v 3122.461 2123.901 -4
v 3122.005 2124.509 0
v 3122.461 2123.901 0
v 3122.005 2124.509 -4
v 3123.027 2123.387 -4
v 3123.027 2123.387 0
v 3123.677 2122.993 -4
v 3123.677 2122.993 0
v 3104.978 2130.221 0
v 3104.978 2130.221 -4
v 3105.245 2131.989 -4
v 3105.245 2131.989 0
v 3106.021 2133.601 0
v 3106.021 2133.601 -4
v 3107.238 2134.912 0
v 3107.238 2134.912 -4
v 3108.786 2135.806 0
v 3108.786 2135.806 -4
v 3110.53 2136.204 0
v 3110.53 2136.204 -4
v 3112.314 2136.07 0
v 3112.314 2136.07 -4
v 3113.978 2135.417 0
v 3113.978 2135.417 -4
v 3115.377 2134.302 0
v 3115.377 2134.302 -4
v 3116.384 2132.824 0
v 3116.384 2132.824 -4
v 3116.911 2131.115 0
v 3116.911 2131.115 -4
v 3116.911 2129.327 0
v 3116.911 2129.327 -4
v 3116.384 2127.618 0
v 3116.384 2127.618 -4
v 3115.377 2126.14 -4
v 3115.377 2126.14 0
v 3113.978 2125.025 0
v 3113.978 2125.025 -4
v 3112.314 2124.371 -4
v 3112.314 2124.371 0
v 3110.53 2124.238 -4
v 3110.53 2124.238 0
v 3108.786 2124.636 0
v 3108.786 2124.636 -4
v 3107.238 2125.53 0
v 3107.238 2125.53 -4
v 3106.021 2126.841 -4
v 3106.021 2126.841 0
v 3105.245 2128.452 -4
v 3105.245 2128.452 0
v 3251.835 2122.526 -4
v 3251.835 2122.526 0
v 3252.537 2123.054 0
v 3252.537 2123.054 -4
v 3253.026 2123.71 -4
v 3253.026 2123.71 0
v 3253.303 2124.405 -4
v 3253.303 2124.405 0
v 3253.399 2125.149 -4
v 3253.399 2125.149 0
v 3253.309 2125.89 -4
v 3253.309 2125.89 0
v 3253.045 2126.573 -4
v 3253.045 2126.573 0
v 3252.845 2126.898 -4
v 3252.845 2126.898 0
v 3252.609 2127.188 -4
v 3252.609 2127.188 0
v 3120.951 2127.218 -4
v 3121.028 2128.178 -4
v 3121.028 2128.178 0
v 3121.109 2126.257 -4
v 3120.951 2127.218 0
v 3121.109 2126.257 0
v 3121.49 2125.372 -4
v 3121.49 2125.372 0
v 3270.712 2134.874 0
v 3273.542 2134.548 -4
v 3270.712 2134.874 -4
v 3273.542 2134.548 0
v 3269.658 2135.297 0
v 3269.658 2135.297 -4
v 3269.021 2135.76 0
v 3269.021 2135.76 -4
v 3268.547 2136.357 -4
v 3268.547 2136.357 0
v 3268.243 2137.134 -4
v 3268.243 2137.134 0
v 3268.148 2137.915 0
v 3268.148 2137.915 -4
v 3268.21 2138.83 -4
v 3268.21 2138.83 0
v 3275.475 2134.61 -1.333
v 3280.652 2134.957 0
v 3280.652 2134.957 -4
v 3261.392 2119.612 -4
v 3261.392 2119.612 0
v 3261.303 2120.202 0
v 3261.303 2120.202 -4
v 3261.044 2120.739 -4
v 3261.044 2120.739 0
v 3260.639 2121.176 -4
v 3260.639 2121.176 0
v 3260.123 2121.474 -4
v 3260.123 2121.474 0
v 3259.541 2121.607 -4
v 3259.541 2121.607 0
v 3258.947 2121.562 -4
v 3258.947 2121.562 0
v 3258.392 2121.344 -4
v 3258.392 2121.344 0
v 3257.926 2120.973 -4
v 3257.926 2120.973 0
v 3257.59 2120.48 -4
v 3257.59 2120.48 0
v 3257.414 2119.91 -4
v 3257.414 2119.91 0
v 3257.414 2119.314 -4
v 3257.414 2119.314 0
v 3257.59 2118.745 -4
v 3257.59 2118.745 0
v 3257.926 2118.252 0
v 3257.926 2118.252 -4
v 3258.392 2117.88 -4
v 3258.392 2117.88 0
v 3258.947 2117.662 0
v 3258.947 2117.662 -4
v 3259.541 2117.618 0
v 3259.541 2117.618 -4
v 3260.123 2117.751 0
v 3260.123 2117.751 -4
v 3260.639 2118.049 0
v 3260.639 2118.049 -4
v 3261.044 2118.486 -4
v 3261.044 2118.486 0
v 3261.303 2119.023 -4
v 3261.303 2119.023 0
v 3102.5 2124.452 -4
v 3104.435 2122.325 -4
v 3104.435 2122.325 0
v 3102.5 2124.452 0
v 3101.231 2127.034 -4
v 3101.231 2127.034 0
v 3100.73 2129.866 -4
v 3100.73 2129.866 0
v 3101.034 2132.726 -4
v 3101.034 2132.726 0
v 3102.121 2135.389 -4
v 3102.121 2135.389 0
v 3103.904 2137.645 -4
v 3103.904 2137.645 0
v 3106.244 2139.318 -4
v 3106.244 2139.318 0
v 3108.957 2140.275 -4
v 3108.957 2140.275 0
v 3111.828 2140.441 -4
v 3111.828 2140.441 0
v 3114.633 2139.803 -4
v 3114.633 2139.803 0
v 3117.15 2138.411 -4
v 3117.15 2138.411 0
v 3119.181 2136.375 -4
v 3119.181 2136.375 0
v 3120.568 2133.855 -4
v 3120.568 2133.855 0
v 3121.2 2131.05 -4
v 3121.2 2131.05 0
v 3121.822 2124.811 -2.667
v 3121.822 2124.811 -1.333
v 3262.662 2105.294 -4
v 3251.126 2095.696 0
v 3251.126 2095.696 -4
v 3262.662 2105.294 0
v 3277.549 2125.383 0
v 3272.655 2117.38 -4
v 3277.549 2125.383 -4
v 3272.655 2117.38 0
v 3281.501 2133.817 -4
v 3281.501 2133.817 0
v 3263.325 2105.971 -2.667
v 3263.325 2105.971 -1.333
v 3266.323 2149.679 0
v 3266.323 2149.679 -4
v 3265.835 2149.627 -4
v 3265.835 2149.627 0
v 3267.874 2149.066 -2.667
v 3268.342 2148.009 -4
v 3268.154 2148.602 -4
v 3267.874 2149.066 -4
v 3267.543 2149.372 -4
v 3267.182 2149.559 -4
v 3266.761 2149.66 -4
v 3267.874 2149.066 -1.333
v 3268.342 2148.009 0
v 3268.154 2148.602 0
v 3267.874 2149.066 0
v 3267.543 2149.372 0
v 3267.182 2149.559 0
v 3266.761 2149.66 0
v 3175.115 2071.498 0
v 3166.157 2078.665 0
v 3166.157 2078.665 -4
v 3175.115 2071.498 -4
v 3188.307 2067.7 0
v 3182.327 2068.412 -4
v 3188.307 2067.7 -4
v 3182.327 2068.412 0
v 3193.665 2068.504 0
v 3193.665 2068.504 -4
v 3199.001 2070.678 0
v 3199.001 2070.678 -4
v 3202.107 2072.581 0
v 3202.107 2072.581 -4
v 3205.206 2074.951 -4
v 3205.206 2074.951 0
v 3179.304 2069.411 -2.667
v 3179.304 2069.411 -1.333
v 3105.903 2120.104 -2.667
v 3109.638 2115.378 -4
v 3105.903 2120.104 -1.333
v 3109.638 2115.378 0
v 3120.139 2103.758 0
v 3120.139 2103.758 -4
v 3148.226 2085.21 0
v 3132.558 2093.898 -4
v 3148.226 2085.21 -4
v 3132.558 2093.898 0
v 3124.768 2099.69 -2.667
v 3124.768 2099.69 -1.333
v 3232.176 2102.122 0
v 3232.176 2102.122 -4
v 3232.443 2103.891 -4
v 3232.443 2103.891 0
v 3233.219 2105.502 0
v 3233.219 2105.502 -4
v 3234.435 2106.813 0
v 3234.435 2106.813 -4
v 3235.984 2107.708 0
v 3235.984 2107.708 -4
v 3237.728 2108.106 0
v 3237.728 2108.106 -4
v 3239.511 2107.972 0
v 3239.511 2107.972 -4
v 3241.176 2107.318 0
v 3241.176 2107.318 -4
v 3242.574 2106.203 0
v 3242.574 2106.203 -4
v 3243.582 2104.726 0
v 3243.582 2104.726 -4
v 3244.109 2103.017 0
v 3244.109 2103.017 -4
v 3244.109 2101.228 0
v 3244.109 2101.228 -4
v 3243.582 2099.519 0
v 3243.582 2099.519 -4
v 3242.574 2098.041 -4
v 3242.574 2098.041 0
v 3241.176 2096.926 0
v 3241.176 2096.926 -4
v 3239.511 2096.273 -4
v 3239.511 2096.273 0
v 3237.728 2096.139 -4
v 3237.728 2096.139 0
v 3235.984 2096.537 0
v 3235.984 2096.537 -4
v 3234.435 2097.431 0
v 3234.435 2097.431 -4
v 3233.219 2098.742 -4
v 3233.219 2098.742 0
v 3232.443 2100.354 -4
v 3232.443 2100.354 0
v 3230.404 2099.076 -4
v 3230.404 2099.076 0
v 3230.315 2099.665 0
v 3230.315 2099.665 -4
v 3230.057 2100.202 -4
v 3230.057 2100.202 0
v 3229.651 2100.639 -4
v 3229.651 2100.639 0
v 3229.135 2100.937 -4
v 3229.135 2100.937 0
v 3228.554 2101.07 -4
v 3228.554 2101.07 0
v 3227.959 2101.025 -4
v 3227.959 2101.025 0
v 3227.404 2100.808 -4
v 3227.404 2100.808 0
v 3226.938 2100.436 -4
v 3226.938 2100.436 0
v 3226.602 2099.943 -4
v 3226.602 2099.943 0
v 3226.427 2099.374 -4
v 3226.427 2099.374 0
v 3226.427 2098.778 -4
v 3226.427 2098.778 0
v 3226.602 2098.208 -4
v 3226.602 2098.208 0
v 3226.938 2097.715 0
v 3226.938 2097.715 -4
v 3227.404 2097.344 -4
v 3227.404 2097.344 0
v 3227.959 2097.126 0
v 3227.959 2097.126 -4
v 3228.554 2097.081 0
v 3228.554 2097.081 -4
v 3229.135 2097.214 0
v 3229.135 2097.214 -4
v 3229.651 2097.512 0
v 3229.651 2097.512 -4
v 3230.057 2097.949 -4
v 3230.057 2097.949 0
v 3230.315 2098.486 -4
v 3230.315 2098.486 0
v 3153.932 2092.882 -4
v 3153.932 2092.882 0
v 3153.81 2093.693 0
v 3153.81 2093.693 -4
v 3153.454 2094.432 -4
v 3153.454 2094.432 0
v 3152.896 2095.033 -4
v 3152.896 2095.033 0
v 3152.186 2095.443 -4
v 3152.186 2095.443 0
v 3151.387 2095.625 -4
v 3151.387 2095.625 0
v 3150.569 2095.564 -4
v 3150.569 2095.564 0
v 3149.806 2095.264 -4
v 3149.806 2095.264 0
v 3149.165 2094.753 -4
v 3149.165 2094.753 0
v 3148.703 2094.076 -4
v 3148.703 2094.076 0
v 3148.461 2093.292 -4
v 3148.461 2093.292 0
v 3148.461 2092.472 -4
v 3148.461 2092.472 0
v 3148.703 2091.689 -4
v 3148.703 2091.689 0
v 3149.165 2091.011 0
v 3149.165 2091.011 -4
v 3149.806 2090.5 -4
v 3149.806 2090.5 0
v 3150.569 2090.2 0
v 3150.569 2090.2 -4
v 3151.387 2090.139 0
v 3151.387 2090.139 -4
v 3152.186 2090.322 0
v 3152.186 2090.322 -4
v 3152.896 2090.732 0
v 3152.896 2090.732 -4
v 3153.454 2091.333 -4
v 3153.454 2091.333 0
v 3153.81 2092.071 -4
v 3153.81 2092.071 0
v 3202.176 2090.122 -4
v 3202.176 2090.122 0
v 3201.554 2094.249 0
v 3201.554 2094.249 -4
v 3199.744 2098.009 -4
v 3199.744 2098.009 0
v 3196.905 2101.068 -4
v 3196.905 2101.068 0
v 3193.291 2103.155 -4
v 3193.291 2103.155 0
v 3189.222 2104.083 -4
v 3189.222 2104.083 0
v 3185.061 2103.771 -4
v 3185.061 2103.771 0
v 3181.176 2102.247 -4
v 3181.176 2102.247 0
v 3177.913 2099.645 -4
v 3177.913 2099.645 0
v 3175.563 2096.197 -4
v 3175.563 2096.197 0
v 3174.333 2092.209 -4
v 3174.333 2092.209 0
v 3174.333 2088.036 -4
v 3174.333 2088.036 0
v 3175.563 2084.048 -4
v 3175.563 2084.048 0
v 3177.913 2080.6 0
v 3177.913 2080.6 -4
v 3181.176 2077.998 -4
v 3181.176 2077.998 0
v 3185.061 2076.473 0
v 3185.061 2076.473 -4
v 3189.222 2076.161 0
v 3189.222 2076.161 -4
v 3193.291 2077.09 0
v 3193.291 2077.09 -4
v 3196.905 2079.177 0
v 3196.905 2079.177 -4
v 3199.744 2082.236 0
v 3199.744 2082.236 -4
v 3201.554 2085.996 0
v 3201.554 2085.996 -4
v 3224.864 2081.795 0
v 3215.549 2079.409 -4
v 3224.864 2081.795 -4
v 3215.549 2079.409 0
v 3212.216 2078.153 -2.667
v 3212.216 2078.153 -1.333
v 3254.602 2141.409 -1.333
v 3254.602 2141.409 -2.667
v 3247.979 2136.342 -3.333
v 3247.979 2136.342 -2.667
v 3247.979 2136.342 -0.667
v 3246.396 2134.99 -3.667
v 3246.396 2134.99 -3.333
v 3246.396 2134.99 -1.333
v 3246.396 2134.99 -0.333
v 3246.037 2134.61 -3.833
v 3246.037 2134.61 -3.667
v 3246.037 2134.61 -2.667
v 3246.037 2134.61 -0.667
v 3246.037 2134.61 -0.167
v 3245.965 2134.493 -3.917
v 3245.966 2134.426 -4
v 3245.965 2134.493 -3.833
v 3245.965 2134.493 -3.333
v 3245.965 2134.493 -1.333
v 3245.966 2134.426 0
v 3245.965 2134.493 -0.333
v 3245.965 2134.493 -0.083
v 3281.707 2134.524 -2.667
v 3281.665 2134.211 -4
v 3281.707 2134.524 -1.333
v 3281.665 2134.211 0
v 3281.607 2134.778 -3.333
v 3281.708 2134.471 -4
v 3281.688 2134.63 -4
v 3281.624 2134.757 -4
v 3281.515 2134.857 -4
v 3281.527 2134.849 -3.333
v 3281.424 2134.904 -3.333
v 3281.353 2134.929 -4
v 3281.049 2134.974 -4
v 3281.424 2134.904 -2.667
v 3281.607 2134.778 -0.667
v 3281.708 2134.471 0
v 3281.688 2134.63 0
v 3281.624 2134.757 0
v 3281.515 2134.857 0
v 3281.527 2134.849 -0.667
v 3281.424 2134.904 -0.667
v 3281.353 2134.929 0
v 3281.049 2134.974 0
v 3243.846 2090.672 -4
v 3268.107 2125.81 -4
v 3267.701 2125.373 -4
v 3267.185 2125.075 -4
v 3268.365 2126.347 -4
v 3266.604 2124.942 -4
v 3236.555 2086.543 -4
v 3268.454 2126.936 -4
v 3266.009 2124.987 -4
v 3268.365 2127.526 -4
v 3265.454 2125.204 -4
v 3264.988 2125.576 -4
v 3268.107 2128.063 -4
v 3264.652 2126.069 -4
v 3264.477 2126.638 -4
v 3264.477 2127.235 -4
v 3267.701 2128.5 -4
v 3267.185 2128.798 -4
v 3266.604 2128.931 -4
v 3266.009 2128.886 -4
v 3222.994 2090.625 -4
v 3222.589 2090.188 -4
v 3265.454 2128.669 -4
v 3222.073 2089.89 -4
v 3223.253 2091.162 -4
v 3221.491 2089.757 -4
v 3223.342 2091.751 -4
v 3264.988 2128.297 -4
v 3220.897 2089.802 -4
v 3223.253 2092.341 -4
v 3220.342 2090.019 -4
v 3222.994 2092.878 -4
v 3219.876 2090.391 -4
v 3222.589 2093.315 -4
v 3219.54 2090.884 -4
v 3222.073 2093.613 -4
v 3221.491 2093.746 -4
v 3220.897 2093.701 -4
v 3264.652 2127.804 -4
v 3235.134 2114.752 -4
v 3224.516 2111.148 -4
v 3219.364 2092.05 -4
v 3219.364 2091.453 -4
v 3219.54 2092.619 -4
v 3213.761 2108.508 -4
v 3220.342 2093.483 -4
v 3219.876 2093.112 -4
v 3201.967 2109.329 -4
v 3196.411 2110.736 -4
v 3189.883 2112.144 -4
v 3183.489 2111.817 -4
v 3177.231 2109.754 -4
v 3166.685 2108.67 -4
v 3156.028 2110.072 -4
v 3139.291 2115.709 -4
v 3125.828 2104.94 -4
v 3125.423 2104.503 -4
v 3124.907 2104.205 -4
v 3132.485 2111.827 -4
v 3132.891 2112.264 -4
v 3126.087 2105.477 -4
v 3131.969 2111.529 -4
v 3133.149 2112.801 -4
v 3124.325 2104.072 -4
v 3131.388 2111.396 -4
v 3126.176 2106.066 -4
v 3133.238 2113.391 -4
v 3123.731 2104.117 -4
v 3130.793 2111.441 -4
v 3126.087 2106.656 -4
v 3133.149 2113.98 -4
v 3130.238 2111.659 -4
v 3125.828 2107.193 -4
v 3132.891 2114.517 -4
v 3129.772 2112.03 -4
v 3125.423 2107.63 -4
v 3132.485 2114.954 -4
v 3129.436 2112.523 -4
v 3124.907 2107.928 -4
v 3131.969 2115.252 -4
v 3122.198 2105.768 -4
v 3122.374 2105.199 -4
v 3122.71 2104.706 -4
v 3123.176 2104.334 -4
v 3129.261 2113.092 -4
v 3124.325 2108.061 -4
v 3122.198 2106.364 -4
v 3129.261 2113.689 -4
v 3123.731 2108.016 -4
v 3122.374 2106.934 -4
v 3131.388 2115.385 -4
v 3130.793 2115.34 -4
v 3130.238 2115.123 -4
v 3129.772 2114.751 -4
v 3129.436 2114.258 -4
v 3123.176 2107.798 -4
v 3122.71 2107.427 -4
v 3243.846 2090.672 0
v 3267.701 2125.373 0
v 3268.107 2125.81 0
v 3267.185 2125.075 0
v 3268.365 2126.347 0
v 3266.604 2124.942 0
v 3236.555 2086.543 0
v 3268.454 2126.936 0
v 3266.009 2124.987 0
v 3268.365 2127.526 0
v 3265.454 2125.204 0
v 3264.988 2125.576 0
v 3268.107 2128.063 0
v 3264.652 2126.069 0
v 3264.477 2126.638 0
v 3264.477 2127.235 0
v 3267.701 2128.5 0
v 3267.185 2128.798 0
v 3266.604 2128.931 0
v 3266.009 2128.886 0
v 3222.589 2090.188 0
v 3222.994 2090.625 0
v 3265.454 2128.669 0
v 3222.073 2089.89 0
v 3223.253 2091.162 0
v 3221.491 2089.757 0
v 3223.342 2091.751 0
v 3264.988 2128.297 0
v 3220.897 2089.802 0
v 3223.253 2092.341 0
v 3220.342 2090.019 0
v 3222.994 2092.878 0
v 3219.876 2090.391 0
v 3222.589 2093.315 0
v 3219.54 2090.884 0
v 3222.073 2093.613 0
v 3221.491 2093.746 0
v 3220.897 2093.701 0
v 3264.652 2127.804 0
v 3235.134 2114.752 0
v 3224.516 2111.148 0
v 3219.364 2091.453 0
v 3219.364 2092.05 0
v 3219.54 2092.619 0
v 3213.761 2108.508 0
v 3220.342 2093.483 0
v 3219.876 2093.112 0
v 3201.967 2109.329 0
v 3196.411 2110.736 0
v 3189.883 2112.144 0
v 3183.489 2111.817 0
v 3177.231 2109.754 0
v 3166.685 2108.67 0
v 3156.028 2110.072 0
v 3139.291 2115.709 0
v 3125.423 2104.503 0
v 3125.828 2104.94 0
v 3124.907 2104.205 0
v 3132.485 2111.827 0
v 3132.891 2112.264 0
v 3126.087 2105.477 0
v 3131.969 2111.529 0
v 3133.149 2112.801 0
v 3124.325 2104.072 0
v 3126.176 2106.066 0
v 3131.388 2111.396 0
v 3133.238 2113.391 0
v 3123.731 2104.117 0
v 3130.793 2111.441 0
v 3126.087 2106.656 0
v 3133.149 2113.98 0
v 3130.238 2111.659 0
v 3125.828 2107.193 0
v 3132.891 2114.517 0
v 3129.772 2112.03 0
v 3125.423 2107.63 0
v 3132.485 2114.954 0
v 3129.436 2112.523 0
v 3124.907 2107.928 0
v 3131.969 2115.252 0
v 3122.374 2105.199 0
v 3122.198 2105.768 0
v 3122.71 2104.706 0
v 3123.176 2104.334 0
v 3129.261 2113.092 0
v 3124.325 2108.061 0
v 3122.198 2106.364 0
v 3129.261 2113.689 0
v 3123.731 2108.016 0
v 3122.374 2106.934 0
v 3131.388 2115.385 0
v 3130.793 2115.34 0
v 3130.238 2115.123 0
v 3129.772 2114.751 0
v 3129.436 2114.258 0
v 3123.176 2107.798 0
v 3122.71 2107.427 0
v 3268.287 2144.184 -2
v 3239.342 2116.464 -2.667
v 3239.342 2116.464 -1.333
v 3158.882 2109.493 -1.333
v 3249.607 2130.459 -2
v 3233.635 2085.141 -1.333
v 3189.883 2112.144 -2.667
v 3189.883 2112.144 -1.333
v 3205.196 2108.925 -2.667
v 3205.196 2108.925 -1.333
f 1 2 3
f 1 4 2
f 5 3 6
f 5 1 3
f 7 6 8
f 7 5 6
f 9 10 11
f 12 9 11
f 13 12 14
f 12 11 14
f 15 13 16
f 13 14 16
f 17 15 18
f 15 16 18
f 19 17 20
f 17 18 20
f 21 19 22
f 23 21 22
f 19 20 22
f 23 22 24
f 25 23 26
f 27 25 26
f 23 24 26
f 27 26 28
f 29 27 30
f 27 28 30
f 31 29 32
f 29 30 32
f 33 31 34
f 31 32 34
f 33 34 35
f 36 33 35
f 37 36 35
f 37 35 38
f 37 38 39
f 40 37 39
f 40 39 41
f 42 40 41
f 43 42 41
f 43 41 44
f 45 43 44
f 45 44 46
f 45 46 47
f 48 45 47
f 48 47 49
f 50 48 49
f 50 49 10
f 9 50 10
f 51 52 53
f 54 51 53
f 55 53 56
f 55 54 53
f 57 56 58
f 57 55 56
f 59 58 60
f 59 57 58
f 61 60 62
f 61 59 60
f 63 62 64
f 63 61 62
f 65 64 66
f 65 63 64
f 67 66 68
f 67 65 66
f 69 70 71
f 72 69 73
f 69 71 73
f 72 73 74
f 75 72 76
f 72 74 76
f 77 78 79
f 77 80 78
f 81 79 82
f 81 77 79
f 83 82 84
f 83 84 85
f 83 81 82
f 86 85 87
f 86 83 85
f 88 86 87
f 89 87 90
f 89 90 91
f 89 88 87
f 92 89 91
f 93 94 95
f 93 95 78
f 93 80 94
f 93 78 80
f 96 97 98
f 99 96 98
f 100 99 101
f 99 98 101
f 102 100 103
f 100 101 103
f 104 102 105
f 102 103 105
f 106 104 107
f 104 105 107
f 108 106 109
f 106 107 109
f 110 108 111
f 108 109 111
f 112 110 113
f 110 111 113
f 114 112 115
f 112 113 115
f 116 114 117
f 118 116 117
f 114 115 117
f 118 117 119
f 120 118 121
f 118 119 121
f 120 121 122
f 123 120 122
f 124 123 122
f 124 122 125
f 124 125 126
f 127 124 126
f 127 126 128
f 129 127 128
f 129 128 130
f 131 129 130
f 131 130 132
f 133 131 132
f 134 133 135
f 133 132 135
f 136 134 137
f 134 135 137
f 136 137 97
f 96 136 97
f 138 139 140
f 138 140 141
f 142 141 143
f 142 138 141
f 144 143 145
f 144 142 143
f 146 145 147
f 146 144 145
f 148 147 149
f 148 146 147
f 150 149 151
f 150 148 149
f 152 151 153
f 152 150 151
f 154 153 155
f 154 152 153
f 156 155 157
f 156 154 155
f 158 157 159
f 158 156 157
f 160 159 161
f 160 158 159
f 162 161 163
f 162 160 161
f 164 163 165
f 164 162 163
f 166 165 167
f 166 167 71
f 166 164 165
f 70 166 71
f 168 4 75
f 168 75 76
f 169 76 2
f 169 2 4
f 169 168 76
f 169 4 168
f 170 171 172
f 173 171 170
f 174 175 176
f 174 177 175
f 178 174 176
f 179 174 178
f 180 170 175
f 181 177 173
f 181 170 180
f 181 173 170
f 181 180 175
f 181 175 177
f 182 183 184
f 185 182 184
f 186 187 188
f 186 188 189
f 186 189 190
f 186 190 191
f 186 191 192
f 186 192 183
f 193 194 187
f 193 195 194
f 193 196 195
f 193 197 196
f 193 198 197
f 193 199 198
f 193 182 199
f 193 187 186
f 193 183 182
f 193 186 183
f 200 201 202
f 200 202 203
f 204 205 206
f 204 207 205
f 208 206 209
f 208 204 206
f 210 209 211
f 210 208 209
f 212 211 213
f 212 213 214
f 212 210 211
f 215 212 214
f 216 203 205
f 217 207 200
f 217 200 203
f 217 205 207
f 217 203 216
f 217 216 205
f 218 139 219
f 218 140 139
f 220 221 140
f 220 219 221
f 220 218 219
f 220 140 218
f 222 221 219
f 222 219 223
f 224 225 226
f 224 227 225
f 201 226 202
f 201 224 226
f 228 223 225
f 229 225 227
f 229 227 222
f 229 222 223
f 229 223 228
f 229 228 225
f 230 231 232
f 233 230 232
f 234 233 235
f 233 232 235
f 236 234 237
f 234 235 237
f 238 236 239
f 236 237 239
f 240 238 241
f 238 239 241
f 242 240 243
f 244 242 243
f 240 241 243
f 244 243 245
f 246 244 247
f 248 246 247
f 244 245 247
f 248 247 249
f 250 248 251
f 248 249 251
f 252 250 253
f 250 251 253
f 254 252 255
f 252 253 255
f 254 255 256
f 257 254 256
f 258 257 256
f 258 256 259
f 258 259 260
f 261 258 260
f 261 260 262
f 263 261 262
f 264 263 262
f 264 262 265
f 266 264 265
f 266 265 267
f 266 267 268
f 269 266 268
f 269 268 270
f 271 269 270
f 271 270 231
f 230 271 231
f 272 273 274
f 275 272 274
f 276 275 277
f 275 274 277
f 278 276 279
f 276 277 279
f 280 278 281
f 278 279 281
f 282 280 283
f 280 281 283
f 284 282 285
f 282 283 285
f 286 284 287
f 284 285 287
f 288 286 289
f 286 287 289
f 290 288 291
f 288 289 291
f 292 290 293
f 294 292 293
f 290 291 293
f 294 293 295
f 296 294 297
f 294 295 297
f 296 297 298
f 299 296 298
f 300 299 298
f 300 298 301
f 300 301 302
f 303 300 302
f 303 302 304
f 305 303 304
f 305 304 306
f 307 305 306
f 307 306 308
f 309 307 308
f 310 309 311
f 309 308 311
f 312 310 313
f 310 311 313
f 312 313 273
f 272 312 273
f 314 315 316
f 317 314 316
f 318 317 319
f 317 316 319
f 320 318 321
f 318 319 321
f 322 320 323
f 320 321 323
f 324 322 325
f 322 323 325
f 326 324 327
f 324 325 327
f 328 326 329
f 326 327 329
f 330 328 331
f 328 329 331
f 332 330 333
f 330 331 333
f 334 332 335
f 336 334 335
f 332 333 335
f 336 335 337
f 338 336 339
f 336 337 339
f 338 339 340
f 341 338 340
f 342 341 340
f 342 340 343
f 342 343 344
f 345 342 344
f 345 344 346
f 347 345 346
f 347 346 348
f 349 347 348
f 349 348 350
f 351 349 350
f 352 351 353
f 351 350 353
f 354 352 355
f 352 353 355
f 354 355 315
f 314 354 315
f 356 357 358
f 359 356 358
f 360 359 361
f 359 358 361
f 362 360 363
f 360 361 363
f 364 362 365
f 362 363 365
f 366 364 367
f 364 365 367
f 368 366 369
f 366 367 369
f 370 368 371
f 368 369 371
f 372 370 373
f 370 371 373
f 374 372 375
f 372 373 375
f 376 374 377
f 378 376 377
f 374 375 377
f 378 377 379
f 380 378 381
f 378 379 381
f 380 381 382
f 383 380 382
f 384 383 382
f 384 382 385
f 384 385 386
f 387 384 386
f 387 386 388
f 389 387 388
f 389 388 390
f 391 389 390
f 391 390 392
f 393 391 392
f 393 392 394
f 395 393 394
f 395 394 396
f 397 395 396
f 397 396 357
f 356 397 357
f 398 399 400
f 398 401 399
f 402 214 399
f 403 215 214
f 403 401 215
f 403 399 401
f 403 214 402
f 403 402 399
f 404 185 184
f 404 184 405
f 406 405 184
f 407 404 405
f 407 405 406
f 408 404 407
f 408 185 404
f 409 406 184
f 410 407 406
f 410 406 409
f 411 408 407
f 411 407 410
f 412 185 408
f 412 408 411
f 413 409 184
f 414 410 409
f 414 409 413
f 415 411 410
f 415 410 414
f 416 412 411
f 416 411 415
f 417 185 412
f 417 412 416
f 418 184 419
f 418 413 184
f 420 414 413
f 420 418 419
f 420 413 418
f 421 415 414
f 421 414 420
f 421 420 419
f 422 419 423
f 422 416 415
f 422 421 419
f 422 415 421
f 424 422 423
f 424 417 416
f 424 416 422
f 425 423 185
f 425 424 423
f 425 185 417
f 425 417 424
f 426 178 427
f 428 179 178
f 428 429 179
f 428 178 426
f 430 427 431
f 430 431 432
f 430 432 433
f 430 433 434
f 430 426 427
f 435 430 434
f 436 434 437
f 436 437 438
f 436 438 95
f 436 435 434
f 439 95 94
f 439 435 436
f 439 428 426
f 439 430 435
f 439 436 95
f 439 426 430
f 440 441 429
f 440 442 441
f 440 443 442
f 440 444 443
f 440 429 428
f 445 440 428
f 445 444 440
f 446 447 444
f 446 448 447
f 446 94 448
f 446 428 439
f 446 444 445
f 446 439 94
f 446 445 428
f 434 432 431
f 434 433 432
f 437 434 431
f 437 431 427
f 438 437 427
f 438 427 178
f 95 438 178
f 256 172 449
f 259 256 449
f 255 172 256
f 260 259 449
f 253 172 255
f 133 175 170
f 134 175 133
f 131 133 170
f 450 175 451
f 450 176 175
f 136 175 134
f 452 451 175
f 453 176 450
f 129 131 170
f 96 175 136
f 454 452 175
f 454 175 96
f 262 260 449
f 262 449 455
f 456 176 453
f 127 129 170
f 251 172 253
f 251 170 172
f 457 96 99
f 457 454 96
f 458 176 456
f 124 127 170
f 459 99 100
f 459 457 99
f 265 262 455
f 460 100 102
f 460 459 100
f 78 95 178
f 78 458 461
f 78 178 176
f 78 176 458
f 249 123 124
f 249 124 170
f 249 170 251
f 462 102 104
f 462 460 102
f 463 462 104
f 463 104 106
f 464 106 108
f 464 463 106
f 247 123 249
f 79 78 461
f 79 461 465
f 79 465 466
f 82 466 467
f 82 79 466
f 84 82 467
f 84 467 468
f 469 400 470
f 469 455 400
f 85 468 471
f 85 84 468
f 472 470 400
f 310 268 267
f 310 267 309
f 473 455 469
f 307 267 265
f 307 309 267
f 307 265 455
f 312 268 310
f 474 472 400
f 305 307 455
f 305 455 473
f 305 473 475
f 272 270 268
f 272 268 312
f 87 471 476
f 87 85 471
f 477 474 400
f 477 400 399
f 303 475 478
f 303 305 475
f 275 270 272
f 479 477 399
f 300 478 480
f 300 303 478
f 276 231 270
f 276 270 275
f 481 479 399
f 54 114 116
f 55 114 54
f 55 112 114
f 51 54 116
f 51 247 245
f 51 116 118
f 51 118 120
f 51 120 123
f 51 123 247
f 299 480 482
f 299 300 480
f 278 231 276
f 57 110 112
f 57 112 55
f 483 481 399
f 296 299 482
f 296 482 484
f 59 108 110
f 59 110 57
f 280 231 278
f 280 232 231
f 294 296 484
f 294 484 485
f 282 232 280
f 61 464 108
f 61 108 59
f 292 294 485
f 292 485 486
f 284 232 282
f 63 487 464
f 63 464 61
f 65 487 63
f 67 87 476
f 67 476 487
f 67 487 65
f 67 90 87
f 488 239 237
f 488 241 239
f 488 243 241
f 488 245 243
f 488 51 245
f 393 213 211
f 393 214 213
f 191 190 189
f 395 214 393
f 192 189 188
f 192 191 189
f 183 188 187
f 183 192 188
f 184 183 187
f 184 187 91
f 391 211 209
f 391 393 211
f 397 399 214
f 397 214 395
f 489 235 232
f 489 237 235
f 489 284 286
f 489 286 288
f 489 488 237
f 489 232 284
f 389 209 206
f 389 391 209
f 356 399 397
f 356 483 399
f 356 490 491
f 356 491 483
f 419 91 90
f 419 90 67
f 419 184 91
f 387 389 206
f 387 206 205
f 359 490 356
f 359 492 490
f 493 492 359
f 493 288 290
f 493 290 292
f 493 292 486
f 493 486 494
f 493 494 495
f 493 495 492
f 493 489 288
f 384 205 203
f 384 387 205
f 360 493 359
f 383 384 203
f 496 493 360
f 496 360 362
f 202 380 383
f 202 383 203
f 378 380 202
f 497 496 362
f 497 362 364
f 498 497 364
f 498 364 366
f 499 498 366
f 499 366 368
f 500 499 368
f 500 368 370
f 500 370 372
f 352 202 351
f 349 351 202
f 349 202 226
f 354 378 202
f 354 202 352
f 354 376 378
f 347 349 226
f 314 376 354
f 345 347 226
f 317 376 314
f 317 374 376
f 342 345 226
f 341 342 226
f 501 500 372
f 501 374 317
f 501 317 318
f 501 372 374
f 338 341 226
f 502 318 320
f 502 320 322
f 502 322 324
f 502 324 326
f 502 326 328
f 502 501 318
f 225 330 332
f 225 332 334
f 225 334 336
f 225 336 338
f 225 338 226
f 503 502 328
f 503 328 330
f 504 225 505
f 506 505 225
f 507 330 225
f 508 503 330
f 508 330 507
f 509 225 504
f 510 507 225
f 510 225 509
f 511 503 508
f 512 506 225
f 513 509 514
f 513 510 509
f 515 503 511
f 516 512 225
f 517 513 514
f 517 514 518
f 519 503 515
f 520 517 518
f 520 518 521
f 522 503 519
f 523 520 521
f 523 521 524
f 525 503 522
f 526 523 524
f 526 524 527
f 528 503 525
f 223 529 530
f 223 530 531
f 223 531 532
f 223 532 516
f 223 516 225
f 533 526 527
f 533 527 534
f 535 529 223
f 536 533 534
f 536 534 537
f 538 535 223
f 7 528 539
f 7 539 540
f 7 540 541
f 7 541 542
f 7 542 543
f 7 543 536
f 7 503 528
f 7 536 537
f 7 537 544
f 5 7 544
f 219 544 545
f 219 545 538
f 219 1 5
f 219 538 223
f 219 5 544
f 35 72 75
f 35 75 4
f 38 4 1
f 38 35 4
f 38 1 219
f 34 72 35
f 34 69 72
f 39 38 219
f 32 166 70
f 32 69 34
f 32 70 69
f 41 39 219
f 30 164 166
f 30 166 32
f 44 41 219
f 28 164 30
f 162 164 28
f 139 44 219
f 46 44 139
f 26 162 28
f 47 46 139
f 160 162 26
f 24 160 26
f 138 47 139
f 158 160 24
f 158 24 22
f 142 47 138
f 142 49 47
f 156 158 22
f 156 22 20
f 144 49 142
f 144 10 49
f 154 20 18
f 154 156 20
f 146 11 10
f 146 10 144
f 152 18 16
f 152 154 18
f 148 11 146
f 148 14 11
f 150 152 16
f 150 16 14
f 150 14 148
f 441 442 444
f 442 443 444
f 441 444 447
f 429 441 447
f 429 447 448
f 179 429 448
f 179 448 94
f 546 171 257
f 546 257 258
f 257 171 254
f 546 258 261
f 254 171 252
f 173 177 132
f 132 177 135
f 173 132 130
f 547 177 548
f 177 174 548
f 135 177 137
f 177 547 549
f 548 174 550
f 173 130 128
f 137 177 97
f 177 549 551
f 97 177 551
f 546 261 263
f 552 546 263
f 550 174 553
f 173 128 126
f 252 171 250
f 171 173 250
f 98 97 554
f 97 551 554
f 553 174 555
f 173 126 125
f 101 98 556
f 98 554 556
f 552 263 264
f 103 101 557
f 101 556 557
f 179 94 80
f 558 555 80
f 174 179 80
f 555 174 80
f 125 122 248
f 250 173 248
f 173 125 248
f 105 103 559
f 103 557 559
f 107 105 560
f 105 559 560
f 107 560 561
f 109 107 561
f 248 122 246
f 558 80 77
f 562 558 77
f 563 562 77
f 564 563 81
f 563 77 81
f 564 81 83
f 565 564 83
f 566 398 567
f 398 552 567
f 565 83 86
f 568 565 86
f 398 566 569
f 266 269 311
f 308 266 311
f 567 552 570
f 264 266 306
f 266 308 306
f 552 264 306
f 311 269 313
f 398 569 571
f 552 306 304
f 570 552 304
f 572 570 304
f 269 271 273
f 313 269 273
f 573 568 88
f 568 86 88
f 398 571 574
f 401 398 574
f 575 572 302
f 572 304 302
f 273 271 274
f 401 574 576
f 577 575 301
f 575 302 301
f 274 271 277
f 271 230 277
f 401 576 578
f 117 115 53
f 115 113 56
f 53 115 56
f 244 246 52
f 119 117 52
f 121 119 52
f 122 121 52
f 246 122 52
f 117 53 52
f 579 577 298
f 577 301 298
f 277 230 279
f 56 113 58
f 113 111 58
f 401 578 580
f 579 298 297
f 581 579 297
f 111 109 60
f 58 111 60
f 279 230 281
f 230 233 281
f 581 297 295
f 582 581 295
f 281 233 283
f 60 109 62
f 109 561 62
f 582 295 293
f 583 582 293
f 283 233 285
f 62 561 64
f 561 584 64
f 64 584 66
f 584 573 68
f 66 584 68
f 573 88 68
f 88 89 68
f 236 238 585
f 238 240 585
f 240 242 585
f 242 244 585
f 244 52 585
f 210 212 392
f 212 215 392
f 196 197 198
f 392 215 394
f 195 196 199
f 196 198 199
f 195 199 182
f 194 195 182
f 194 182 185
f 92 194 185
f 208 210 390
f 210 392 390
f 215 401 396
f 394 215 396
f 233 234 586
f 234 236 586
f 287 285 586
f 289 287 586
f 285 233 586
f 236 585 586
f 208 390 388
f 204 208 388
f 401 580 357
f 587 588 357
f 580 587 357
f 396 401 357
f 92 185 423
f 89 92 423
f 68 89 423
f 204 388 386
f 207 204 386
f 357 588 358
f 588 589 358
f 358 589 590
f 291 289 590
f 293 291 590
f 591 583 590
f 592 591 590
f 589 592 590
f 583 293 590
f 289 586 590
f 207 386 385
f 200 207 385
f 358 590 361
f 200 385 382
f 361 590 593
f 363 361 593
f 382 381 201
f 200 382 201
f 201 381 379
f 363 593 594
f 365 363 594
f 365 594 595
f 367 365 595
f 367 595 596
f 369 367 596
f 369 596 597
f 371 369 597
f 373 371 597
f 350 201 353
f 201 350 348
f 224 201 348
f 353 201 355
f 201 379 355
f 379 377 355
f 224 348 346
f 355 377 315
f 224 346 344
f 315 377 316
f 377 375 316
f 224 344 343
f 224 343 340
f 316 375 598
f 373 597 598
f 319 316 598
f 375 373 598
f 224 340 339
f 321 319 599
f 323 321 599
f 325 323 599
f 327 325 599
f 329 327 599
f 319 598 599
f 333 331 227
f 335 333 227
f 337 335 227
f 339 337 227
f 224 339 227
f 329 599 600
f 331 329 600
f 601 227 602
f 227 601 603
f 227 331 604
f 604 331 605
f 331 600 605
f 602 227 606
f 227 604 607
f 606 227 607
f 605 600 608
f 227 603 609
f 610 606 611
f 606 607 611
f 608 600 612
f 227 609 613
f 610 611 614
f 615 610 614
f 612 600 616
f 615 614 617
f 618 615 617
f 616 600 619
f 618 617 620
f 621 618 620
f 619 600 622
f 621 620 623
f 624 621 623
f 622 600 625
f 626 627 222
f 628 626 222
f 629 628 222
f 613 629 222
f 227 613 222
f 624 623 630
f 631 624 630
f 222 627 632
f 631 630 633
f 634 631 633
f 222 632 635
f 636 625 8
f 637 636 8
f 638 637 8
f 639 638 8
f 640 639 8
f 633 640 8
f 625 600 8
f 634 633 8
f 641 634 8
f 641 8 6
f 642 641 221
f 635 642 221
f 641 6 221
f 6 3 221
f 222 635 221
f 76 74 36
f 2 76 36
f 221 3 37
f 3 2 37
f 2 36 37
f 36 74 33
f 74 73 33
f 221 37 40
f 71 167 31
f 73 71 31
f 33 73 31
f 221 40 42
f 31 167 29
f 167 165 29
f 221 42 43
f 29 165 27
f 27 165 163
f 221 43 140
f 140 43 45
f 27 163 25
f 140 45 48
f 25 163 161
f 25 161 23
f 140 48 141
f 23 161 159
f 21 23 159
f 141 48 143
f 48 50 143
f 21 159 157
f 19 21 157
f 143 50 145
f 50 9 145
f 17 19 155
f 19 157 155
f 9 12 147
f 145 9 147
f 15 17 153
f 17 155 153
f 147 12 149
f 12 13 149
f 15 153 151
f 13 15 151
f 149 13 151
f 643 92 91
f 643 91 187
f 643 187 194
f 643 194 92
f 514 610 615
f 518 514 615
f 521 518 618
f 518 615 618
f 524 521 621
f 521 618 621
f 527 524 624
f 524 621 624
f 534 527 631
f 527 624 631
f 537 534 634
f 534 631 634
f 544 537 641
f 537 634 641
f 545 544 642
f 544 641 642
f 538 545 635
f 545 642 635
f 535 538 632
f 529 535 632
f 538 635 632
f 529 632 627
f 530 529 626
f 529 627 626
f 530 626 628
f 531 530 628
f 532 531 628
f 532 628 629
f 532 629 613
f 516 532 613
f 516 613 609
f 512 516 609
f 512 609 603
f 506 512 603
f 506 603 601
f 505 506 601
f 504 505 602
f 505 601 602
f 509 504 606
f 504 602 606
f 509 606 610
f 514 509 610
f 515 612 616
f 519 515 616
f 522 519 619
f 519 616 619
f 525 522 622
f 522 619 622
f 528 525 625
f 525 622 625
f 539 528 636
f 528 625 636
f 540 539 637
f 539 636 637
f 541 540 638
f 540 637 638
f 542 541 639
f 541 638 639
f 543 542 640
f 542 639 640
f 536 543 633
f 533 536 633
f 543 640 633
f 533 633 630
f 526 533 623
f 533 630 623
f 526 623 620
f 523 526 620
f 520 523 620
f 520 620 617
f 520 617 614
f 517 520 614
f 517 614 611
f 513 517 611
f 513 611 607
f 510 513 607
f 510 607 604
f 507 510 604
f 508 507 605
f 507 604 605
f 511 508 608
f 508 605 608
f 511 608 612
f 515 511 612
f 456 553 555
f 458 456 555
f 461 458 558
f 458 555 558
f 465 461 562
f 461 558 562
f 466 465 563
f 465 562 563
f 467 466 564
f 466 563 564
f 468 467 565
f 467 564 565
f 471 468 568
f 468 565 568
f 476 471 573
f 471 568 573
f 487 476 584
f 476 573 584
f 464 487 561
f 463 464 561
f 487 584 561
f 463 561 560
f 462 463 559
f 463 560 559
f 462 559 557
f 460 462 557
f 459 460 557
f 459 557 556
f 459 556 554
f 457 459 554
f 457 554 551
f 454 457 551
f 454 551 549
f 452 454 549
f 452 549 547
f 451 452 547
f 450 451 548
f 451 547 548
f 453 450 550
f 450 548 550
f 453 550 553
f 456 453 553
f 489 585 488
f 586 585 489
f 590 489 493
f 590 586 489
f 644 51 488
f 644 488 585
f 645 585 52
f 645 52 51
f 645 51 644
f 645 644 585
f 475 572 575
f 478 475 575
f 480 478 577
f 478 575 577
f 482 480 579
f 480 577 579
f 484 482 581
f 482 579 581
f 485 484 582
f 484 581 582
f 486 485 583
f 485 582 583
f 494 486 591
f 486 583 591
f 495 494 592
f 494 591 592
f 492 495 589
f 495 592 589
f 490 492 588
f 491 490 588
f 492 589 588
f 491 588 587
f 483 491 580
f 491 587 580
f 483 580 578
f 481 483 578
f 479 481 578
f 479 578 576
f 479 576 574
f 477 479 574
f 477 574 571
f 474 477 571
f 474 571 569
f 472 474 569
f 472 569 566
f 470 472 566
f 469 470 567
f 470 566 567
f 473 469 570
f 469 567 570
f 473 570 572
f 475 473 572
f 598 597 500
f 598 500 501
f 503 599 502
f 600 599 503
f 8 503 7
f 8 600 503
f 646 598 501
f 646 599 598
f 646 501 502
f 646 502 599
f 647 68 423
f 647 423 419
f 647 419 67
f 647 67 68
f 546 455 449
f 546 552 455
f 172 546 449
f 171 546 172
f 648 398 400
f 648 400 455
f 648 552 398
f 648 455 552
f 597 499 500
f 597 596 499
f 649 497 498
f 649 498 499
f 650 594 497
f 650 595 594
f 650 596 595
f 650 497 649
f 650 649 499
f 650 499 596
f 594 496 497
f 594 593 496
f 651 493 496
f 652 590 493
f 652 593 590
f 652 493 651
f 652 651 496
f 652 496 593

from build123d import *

# Parameters (mm, degrees)
MODEL_R               = 4.250003312
MODEL_R_2             = 2.750739051
MODEL_R_3             = 2
TABAN_FLAN_1_DEPTH    = 4
IZIM1_W               = 33.261087109
IZIM1_H               = 28.852991227
SEKME1_DEPTH          = 4
IZIM4_R               = 14
KES_EKSTR_ZYON1_DEPTH = 10
IZIM5_R               = 6
KES_EKSTR_ZYON2_DEPTH = 10
RADYUS1_R             = 3
IZIM6_R               = 10.255106093
IZIM6_R_2             = 3.797139687
SEKME2_DEPTH          = 4
IZIM9_R               = 6
KES_EKSTR_ZYON3_DEPTH = 10
RADYUS2_R             = 4


# Sheet-metal steps are written as plain solids
with BuildPart() as part:
    # Model → Taban-Flanş1 (new body)
    with BuildSketch(Plane.XY):
        with BuildLine():
            add(Edge.make_bspline(
                [(3109.63786856, 2115.37754708), (3122.91316856, 2098.00144708), (3141.75296856, 2085.65664708), (3166.15706856, 2078.66474708)],
                knots=[0, 0, 0, 0, 0.026315789, 0.026315789, 0.026315789, 0.026315789], degree=3))
            add(Edge.make_bspline(
                [(3166.15706856, 2078.66474708), (3179.36946856, 2065.40354708), (3192.38586856, 2064.16554708), (3205.20626856, 2074.95084708)],
                knots=[0.052631579, 0.052631579, 0.052631579, 0.052631579, 0.078947368, 0.078947368, 0.078947368, 0.078947368], degree=3))
            add(Edge.make_bspline(
                [(3205.20626856, 2074.95084708), (3212.44426856, 2078.61404708), (3218.99666856, 2080.89554708), (3224.86356856, 2081.79514708)],
                knots=[0.105263158, 0.105263158, 0.105263158, 0.105263158, 0.131578947, 0.131578947, 0.131578947, 0.131578947], degree=3))
            add(Edge.make_bspline(
                [(3224.86356856, 2081.79514708), (3233.64336856, 2084.49734708), (3242.39766856, 2089.13084708), (3251.12626856, 2095.69584708)],
                knots=[0.157894737, 0.157894737, 0.157894737, 0.157894737, 0.184210526, 0.184210526, 0.184210526, 0.184210526], degree=3))
            add(Edge.make_bspline(
                [(3251.12626856, 2095.69584708), (3263.93226856, 2104.28284708), (3275.34806856, 2118.40454708), (3281.50066856, 2133.81654708)],
                knots=[0.210526316, 0.210526316, 0.210526316, 0.210526316, 0.236842105, 0.236842105, 0.236842105, 0.236842105], degree=3))
            add(Edge.make_bspline(
                [(3281.50066856, 2133.81654708), (3281.95096856, 2134.68714708), (3281.66796856, 2135.06734708), (3280.65166856, 2134.95694708)],
                knots=[0.263157895, 0.263157895, 0.263157895, 0.263157895, 0.289473684, 0.289473684, 0.289473684, 0.289473684], degree=3))
            add(Edge.make_bspline(
                [(3280.65166856, 2134.95694708), (3276.72366856, 2135.05064708), (3267.28426856, 2132.56494708), (3268.20996856, 2138.83004708)],
                knots=[0.315789474, 0.315789474, 0.315789474, 0.315789474, 0.342105263, 0.342105263, 0.342105263, 0.342105263], degree=3))
            add(Edge.make_bspline(
                [(3268.20996856, 2138.83004708), (3268.29816856, 2144.94904708), (3268.34226856, 2148.00864708)],
                knots=[0.368421053, 0.368421053, 0.368421053, 0.394736842, 0.394736842, 0.394736842], degree=2))
            add(Edge.make_bspline(
                [(3268.34226856, 2148.00864708), (3268.05746856, 2149.32424708), (3267.22186856, 2149.86364708), (3265.83536856, 2149.62684708)],
                knots=[0.421052632, 0.421052632, 0.421052632, 0.421052632, 0.447368421, 0.447368421, 0.447368421, 0.447368421], degree=3))
            add(Edge.make_bspline(
                [(3265.83536856, 2149.62684708), (3252.29706856, 2139.83354708), (3245.67386856, 2134.76664708), (3245.96566856, 2134.42624708)],
                knots=[0.473684211, 0.473684211, 0.473684211, 0.473684211, 0.5, 0.5, 0.5, 0.5], degree=3))
            add(Edge.make_bspline(
                [(3245.96566856, 2134.42624708), (3252.10236856, 2127.74094708), (3255.17056856, 2124.39824708)],
                knots=[0.526315789, 0.526315789, 0.526315789, 0.552631579, 0.552631579, 0.552631579], degree=2))
            add(Edge.make_bspline(
                [(3255.17056856, 2124.39824708), (3241.72096856, 2116.62674708), (3227.91756856, 2111.32994708), (3213.76056856, 2108.50784708)],
                knots=[0.578947368, 0.578947368, 0.578947368, 0.578947368, 0.605263158, 0.605263158, 0.605263158, 0.605263158], degree=3))
            add(Edge.make_bspline(
                [(3213.76056856, 2108.50784708), (3203.77946856, 2108.56904708), (3198.07446856, 2109.89254708), (3196.41116856, 2110.73614708)],
                knots=[0.631578947, 0.631578947, 0.631578947, 0.631578947, 0.657894737, 0.657894737, 0.657894737, 0.657894737], degree=3))
            add(Edge.make_bspline(
                [(3196.41116856, 2110.73614708), (3189.81546856, 2113.01174708), (3183.42196856, 2112.68434708), (3177.23076856, 2109.75424708)],
                knots=[0.684210526, 0.684210526, 0.684210526, 0.684210526, 0.710526316, 0.710526316, 0.710526316, 0.710526316], degree=3))
            add(Edge.make_bspline(
                [(3177.23076856, 2109.75424708), (3158.79236856, 2105.21744708), (3138.82946856, 2115.68974708), (3122.63636856, 2123.49564708)],
                knots=[0.736842105, 0.736842105, 0.736842105, 0.736842105, 0.763157895, 0.763157895, 0.763157895, 0.763157895], degree=3))
            add(Edge.make_bspline(
                [(3122.63636856, 2123.49564708), (3121.05686856, 2125.98834708), (3120.33186856, 2127.40314708), (3120.46116856, 2127.73984708)],
                knots=[0.789473684, 0.789473684, 0.789473684, 0.789473684, 0.815789474, 0.815789474, 0.815789474, 0.815789474], degree=3))
            add(Edge.make_bspline(
                [(3120.46116856, 2127.73984708), (3120.65286856, 2134.03014708), (3118.79596856, 2137.76174708), (3114.89056856, 2138.93464708)],
                knots=[0.842105263, 0.842105263, 0.842105263, 0.842105263, 0.868421053, 0.868421053, 0.868421053, 0.868421053], degree=3))
            add(Edge.make_bspline(
                [(3114.89056856, 2138.93464708), (3107.86456856, 2140.79974708), (3103.26626856, 2138.32384708), (3101.09596856, 2131.50664708)],
                knots=[0.894736842, 0.894736842, 0.894736842, 0.894736842, 0.921052632, 0.921052632, 0.921052632, 0.921052632], degree=3))
            add(Edge.make_bspline(
                [(3101.09596856, 2131.50664708), (3101.31076856, 2127.06704708), (3104.15806856, 2121.69074708), (3109.63786856, 2115.37754708)],
                knots=[0.947368421, 0.947368421, 0.947368421, 0.947368421, 1, 1, 1, 1], degree=3))
        make_face()
        with Locations((3110.978473341, 2130.220867466)):
            Circle(MODEL_R, mode=Mode.SUBTRACT)
        with Locations((3151.181278155, 2092.882262914)):
            Circle(MODEL_R_2, mode=Mode.SUBTRACT)
        with Locations((3131.238292653, 2113.390554749)):
            Circle(MODEL_R_3, mode=Mode.SUBTRACT)
        with Locations((3124.175950785, 2106.066377098)):
            Circle(MODEL_R_3, mode=Mode.SUBTRACT)
        with Locations((3266.454212243, 2126.936459372)):
            Circle(MODEL_R_3, mode=Mode.SUBTRACT)
        with Locations((3259.391870375, 2119.612281721)):
            Circle(MODEL_R_3, mode=Mode.SUBTRACT)
        with Locations((3228.404290977, 2099.075593739)):
            Circle(MODEL_R_3, mode=Mode.SUBTRACT)
        with Locations((3221.341949109, 2091.751416088)):
            Circle(MODEL_R_3, mode=Mode.SUBTRACT)
        with BuildLine():
            add(Edge.make_bspline(
                [(3202.10906856, 2089.91944708), (3202.10906856, 2097.65144708), (3195.84106856, 2103.91944708), (3188.10906856, 2103.91944708)],
                knots=[0, 0, 0, 0, 0.2, 0.2, 0.2, 0.2], degree=3))
            add(Edge.make_bspline(
                [(3188.10906856, 2103.91944708), (3180.37706856, 2103.91954708), (3174.10906856, 2097.65154708), (3174.10906856, 2089.91954708)],
                knots=[0.2, 0.2, 0.2, 0.2, 0.4, 0.4, 0.4, 0.4], degree=3))
            add(Edge.make_bspline(
                [(3174.10906856, 2089.91954708), (3174.10906856, 2082.18754708), (3180.37696856, 2075.91954708), (3188.10896856, 2075.91944708)],
                knots=[0.4, 0.4, 0.4, 0.4, 0.6, 0.6, 0.6, 0.6], degree=3))
            add(Edge.make_bspline(
                [(3188.10896856, 2075.91944708), (3195.84096856, 2075.91944708), (3202.10896856, 2082.18744708), (3202.10906856, 2089.91944708)],
                knots=[0.6, 0.6, 0.6, 0.6, 1, 1, 1, 1], degree=3))
        make_face(mode=Mode.SUBTRACT)
    extrude(amount=-TABAN_FLAN_1_DEPTH)

    # Çizim1 → Sekme1 (add)
    with BuildSketch(Plane.XY):
        with Locations((3187.445358668, 2090.033249542)):
            Rectangle(IZIM1_W, IZIM1_H)
    extrude(amount=-SEKME1_DEPTH)

    # Çizim4 → Kes-Ekstrüzyon1 (cut)
    with BuildSketch(Plane.XY):
        with Locations((3188.176183509, 2090.122283307)):
            Circle(IZIM4_R)
    extrude(amount=-KES_EKSTR_ZYON1_DEPTH, mode=Mode.SUBTRACT)

    # Çizim5 → Kes-Ekstrüzyon2 (cut)
    with BuildSketch(Plane(origin=(0, 0, -4), x_dir=(-1, 0, 0), z_dir=(0, 0, -1))):
        with Locations((-3238.176183509, 2102.122283307)):
            Circle(IZIM5_R)
    extrude(amount=-KES_EKSTR_ZYON2_DEPTH, mode=Mode.SUBTRACT)

    # Radyus1
    radyus1_edges = [part.edges().sort_by_distance(p)[0] for p in [
        (3255.17056856, 2124.39824708, -2),
    ]]
    fillet(radyus1_edges, radius=RADYUS1_R)

    # Çizim6 → Sekme2 (add)
    with BuildSketch(Plane(origin=(0, 0, -4), x_dir=(-1, 0, 0), z_dir=(0, 0, -1))):
        with Locations((-3110.978473341, 2130.220867466)):
            Circle(IZIM6_R)
        with Locations((-3110.978473341, 2130.220867466)):
            Circle(IZIM6_R_2, mode=Mode.SUBTRACT)
    extrude(amount=-SEKME2_DEPTH)

    # Çizim9 → Kes-Ekstrüzyon3 (cut)
    with BuildSketch(Plane(origin=(0, 0, -4), x_dir=(-1, 0, 0), z_dir=(0, 0, -1))):
        with Locations((-3110.978473341, 2130.220867466)):
            Circle(IZIM9_R)
    extrude(amount=-KES_EKSTR_ZYON3_DEPTH, mode=Mode.SUBTRACT)

    # Radyus2
    radyus2_edges = [part.edges().sort_by_distance(p)[0] for p in [
        (3122.63636856, 2123.49564708, -2),
        (3120.680098466, 2126.897364658, -2),
    ]]
    fillet(radyus2_edges, radius=RADYUS2_R)


solid = part.part
